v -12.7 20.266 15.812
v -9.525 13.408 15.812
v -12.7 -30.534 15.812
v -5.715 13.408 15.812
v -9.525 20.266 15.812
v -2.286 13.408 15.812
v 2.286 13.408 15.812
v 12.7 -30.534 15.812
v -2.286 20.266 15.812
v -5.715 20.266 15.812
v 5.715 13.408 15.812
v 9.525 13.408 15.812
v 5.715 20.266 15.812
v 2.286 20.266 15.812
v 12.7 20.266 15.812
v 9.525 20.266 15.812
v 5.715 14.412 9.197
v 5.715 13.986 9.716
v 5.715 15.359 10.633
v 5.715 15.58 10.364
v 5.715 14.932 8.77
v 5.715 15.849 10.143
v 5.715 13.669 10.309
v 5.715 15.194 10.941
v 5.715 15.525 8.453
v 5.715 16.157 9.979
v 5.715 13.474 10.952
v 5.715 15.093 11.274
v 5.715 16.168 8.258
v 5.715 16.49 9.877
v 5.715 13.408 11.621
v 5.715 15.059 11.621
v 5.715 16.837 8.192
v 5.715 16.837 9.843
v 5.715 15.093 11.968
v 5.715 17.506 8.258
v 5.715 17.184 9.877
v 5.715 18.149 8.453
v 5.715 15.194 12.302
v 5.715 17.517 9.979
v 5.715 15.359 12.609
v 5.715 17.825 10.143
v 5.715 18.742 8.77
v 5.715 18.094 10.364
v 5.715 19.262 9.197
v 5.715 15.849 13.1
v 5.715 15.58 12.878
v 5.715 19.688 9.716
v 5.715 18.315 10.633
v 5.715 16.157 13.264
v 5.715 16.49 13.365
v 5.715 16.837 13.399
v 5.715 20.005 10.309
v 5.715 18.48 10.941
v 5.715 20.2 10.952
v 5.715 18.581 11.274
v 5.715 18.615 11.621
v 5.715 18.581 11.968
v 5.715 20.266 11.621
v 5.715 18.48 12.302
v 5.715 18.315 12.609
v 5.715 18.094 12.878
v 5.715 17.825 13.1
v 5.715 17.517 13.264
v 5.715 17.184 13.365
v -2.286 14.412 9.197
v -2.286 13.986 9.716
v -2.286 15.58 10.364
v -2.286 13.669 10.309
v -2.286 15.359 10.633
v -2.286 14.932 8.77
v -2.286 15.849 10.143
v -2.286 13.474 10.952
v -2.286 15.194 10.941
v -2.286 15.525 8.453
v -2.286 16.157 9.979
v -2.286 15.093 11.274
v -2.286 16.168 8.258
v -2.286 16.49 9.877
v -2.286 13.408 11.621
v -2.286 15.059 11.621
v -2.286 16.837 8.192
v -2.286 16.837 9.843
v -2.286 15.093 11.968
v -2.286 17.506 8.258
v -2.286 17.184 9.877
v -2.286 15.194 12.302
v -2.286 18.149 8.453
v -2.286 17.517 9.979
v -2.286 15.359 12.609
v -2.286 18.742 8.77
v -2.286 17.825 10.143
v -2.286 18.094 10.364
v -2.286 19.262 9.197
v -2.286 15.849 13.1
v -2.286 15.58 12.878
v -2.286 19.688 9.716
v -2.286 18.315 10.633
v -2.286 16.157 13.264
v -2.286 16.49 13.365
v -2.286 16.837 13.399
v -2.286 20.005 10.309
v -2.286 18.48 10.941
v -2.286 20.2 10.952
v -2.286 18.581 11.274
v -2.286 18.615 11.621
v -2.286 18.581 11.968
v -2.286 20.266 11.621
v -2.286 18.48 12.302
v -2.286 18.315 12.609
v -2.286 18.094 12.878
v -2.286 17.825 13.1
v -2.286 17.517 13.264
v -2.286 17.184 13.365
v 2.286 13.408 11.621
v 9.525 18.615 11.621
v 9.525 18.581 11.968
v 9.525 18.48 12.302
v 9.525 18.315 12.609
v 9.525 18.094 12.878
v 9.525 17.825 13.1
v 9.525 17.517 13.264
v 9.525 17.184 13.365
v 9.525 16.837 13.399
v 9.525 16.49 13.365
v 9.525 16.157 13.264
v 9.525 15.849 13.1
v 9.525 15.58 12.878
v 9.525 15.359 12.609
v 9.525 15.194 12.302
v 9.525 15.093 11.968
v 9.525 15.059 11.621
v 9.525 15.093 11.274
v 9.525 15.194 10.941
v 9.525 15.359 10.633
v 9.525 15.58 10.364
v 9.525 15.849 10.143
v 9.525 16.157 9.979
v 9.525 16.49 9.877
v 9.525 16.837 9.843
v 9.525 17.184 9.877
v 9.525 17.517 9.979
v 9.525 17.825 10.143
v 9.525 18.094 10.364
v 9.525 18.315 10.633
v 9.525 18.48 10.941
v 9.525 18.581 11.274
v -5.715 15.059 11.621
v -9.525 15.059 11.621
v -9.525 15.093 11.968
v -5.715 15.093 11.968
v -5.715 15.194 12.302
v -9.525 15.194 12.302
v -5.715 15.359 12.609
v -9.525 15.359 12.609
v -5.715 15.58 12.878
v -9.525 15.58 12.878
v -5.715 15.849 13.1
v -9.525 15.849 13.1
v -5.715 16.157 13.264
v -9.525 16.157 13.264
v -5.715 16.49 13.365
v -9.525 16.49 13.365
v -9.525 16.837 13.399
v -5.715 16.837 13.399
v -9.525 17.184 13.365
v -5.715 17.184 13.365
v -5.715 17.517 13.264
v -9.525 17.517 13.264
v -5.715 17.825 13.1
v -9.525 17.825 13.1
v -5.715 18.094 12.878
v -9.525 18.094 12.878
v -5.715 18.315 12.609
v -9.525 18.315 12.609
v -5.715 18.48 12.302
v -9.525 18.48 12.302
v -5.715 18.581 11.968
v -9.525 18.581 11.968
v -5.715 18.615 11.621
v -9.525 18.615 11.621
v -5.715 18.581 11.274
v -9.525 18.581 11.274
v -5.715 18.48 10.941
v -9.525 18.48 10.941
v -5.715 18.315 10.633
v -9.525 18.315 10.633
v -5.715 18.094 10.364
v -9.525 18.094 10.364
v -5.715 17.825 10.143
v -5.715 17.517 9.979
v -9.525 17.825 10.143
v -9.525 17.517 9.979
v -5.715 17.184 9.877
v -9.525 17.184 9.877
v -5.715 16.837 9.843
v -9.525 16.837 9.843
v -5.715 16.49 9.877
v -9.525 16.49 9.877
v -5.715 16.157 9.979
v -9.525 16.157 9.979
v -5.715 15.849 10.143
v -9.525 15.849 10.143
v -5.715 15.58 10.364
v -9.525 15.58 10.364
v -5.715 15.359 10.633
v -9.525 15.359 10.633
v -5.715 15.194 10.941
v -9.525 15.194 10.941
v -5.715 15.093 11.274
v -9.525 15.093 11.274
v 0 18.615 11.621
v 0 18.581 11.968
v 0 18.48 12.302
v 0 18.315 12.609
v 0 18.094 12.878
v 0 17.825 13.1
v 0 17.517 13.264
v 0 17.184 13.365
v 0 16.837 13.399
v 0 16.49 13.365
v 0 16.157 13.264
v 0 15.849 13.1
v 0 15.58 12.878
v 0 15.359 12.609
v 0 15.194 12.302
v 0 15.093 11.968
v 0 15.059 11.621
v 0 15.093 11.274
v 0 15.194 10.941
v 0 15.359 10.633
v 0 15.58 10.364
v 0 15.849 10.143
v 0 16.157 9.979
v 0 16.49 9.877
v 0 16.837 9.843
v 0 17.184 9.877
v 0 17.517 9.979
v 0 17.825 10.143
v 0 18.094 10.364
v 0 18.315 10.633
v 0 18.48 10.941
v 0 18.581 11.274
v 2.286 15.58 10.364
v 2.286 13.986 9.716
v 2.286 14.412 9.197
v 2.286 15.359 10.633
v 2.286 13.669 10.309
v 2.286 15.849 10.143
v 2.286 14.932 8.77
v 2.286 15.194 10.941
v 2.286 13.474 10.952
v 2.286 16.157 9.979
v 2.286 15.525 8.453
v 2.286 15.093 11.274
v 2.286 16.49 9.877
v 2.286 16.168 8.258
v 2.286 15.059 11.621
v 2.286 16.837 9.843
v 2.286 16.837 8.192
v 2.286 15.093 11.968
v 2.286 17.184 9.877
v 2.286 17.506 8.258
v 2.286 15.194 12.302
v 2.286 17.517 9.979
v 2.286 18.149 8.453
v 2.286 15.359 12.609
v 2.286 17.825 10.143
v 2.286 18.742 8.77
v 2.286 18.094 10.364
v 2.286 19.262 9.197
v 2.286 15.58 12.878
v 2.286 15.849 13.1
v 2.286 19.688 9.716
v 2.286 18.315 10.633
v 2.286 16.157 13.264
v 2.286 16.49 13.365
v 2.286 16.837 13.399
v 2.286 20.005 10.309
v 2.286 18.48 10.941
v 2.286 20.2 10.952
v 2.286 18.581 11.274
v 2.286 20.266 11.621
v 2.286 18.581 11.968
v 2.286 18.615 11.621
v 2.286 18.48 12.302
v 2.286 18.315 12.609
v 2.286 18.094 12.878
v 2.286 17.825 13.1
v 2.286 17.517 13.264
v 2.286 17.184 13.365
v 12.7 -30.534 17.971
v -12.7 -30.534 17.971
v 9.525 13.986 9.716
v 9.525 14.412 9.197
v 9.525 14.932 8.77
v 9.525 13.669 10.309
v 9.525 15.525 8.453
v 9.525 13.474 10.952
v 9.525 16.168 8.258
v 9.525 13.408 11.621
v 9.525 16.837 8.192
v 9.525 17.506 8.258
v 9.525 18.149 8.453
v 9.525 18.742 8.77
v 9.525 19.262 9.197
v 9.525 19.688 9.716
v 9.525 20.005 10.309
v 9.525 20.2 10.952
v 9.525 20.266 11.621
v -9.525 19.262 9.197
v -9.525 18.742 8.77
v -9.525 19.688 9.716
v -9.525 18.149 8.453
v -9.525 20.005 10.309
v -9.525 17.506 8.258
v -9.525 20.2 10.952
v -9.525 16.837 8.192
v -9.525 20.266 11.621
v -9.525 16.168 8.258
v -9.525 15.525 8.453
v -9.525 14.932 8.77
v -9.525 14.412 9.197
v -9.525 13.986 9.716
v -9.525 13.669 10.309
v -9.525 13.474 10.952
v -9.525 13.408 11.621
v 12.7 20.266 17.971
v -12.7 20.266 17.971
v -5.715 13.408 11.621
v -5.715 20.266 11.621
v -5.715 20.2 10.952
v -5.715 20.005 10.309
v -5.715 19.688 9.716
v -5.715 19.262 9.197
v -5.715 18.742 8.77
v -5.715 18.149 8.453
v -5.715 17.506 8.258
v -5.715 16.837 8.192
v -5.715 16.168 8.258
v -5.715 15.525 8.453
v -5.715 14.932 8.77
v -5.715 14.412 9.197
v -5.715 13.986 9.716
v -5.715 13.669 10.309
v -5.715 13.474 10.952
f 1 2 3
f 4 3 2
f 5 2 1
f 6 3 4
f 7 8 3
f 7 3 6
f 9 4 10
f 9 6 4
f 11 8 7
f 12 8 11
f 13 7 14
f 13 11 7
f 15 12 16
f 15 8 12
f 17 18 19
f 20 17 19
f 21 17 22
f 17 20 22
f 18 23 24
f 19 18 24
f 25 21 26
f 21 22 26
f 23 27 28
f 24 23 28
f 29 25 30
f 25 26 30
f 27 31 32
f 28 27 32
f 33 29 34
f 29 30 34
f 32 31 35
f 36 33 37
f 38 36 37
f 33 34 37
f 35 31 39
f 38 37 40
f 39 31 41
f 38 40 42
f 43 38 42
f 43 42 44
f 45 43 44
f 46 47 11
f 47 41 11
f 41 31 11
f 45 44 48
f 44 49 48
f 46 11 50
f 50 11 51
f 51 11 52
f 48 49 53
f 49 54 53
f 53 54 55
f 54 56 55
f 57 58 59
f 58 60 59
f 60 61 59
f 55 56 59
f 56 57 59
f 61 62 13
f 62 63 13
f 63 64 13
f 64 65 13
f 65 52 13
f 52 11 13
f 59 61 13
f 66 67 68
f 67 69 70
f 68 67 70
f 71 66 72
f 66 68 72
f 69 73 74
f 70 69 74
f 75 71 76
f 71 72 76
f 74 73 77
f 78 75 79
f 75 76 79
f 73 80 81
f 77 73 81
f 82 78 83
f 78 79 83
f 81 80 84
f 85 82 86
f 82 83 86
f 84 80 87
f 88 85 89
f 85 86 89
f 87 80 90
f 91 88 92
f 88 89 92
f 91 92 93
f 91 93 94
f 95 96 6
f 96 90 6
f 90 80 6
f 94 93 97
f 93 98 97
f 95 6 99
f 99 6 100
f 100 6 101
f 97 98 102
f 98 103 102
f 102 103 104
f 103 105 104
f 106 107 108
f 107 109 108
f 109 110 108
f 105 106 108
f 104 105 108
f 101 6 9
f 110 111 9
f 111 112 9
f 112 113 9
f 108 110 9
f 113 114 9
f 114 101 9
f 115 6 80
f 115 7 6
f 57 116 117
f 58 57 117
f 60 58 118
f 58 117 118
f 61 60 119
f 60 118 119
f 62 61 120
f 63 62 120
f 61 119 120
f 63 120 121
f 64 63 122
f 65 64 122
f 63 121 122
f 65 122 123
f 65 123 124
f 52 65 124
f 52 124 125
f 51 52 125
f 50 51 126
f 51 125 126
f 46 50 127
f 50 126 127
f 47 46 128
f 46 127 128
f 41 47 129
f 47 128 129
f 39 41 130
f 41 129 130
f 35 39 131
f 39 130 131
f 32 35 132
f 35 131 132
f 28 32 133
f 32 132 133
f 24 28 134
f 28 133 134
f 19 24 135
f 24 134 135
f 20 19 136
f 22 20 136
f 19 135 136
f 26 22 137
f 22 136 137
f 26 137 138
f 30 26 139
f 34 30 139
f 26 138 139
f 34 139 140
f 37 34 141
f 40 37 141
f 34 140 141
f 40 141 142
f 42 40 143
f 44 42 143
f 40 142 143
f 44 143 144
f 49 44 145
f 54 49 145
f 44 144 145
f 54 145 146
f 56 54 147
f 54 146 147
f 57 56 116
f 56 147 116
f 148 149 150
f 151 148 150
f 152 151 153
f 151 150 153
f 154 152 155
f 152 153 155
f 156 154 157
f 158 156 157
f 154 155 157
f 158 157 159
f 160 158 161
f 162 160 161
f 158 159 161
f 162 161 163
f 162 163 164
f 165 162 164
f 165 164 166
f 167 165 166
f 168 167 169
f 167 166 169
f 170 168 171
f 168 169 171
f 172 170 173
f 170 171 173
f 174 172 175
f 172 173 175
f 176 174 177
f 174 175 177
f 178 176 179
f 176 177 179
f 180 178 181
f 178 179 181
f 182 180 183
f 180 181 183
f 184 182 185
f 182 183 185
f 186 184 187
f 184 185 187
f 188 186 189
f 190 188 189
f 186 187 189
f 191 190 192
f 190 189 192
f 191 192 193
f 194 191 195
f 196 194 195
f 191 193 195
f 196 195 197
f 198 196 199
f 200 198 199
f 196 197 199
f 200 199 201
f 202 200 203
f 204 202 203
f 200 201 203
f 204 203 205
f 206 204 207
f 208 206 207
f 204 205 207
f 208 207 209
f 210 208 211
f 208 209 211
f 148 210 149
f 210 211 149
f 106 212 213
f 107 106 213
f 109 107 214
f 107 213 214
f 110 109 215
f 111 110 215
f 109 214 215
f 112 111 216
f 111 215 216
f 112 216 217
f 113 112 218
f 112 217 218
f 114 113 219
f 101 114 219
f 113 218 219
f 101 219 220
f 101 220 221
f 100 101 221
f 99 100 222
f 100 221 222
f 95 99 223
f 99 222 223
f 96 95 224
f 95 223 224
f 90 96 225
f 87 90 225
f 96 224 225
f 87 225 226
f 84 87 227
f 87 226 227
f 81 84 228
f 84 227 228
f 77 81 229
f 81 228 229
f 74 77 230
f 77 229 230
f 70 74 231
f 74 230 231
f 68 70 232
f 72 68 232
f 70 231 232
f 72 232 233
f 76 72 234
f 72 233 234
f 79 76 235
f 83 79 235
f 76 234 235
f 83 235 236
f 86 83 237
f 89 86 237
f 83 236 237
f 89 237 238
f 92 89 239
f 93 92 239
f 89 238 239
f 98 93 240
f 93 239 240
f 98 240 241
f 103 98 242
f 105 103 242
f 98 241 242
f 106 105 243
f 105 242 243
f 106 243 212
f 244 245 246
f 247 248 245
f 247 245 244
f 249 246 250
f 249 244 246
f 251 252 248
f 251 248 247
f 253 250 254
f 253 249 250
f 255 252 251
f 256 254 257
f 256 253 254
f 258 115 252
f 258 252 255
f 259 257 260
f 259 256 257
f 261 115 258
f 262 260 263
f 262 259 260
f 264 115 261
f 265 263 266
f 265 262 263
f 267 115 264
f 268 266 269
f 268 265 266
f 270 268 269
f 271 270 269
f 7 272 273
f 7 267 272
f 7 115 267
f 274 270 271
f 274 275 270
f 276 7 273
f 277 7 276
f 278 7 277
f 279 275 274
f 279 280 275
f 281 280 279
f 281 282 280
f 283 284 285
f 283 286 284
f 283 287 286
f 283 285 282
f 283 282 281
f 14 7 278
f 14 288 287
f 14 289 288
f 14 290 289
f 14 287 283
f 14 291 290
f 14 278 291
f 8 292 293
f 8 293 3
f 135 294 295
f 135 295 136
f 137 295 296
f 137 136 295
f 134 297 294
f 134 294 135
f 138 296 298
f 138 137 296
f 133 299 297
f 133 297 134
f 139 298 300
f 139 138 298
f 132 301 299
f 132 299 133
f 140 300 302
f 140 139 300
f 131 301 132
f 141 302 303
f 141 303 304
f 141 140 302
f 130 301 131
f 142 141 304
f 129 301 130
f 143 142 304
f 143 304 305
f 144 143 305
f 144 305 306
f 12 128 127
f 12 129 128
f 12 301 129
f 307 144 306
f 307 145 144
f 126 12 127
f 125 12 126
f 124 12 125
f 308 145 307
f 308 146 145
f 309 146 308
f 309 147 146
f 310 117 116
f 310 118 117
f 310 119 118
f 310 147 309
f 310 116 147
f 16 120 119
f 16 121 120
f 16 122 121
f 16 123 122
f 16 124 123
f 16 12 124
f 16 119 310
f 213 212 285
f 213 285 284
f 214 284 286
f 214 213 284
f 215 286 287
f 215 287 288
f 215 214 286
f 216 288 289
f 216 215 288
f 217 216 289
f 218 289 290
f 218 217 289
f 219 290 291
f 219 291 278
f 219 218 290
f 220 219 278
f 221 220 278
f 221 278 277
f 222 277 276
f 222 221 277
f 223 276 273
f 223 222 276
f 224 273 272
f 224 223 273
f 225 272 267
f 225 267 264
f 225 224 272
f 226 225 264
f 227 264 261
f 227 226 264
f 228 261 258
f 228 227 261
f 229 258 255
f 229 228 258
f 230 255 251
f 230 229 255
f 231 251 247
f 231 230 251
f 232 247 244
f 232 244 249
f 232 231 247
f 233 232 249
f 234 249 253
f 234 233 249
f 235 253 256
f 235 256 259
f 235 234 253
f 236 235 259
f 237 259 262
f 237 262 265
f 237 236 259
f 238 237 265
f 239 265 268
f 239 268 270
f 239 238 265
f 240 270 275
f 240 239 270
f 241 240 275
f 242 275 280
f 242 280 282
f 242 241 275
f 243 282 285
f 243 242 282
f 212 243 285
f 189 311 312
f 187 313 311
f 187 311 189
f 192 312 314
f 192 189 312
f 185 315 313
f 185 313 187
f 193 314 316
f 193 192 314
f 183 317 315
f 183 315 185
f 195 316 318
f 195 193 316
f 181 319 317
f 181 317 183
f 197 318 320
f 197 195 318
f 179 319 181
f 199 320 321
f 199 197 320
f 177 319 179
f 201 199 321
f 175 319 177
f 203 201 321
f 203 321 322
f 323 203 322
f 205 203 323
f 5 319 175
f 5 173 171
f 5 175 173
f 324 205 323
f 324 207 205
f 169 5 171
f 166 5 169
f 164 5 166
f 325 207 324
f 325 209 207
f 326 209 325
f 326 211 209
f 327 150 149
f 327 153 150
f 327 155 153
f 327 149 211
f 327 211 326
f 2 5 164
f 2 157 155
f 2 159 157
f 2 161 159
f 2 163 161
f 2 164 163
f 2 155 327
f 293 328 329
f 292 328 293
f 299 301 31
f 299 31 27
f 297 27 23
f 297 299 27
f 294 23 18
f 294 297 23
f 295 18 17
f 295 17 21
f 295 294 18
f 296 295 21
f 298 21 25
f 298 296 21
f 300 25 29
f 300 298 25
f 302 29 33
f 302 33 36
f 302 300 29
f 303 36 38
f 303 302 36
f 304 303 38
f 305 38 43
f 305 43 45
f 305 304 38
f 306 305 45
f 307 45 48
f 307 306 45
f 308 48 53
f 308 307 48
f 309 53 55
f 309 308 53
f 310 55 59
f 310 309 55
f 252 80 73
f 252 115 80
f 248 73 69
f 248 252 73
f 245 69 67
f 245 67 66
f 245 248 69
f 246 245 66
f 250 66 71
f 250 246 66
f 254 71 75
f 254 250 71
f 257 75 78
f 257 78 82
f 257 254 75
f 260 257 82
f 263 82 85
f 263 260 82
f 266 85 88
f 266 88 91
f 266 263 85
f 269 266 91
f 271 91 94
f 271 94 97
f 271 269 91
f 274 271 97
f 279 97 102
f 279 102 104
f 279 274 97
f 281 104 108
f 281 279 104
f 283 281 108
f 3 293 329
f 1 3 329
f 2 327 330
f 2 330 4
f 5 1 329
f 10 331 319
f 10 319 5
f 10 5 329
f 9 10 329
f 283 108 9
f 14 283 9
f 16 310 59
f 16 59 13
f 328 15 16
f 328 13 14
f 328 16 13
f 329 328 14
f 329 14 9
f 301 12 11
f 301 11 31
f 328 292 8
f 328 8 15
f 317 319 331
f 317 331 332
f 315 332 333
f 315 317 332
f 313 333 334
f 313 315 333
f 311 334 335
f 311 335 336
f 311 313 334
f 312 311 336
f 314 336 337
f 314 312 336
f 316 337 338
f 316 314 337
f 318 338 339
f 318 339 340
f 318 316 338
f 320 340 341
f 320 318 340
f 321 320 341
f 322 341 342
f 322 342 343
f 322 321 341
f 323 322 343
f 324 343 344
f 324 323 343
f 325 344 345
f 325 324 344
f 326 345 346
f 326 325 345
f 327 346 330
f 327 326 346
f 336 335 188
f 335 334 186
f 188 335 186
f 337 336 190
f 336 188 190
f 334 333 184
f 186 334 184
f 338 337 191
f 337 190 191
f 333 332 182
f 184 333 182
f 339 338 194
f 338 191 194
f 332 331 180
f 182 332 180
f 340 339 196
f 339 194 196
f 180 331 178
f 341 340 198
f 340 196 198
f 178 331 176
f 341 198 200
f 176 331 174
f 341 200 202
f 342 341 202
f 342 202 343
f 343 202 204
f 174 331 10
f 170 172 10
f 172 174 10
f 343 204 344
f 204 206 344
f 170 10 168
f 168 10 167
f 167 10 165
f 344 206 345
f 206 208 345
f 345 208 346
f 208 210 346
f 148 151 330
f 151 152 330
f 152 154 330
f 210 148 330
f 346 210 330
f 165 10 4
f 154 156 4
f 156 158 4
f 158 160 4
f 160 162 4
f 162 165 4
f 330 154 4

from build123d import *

# Parameters (mm, degrees)
F1_DEPTH      = 12.7
F1_DEPTH_BACK = 12.7
F0_R          = 1.778
F2_DEPTH      = 2.286
F2_DEPTH_BACK = 2.286
F4_R          = 1.778
F5_DEPTH      = 3.81
F7_R          = 1.778
F8_DEPTH      = 3.81


with BuildPart() as f1:
    # F0 (on Right) → F1 (new body, two sides)
    with BuildSketch(Plane.YZ) as f1_sk:
        Polygon((20.2659536765, 17.9712367281), (-30.5340463235, 17.9712367281), (-30.5340463235, 15.8122367281), (13.4079536765, 15.8122367281), (20.2659536765, 15.8122367281), align=None)
    extrude(amount=F1_DEPTH)
    extrude(f1_sk.sketch, amount=-F1_DEPTH_BACK)

    # F0 (on Right) → F2 (join, two sides)
    with BuildSketch(Plane.YZ) as f2_sk:
        with BuildLine():
            Line((20.2659536765, 11.6212367281), (20.2659536765, 15.8122367281))
            Line((20.2659536765, 15.8122367281), (13.4079536765, 15.8122367281))
            Line((13.4079536765, 15.8122367281), (13.4079536765, 11.6212367281))
            ThreePointArc((13.4079536765, 11.6212367281), (16.8369536765, 15.0502367281), (20.2659536765, 11.6212367281))
        make_face()
        with BuildLine():
            ThreePointArc((13.4079536765, 11.6212367281), (16.8369536765, 8.1922367281), (20.2659536765, 11.6212367281))
            ThreePointArc((20.2659536765, 11.6212367281), (16.8369536765, 15.0502367281), (13.4079536765, 11.6212367281))
        make_face()
        with Locations((16.8369536765, 11.6212367281)):
            Circle(F0_R, mode=Mode.SUBTRACT)
    extrude(amount=F2_DEPTH)
    extrude(f2_sk.sketch, amount=-F2_DEPTH_BACK)

    # F4 (on offset) → F5 (join)
    with BuildSketch(Plane.YZ.offset(9.525)):
        with BuildLine():
            Line((20.2659536765, 15.8122367281), (13.4079536765, 15.8122367281))
            Line((13.4079536765, 15.8122367281), (13.4079536765, 11.6212367281))
            ThreePointArc((13.4079536765, 11.6212367281), (16.8369536765, 8.1922367281), (20.2659536765, 11.6212367281))
            Line((20.2659536765, 11.6212367281), (20.2659536765, 15.8122367281))
        make_face()
        with Locations((16.8369536765, 11.6212367281)):
            Circle(F4_R, mode=Mode.SUBTRACT)
    extrude(amount=-F5_DEPTH)

    # F7 (on offset) → F8 (join)
    with BuildSketch(Plane(origin=(-9.525, 0, 0), x_dir=(0, -1, 0), z_dir=(-1, 0, 0))):
        with BuildLine():
            Line((-13.4079536765, 11.6212367281), (-13.4079536765, 15.8122367281))
            Line((-13.4079536765, 15.8122367281), (-20.2659536765, 15.8122367281))
            Line((-20.2659536765, 15.8122367281), (-20.2659536765, 11.6212367281))
            ThreePointArc((-20.2659536765, 11.6212367281), (-16.8369536765, 8.1922367281), (-13.4079536765, 11.6212367281))
        make_face()
        with Locations((-16.8369536765, 11.6212367281)):
            Circle(F7_R, mode=Mode.SUBTRACT)
    extrude(amount=-F8_DEPTH)


solid = f1.part
